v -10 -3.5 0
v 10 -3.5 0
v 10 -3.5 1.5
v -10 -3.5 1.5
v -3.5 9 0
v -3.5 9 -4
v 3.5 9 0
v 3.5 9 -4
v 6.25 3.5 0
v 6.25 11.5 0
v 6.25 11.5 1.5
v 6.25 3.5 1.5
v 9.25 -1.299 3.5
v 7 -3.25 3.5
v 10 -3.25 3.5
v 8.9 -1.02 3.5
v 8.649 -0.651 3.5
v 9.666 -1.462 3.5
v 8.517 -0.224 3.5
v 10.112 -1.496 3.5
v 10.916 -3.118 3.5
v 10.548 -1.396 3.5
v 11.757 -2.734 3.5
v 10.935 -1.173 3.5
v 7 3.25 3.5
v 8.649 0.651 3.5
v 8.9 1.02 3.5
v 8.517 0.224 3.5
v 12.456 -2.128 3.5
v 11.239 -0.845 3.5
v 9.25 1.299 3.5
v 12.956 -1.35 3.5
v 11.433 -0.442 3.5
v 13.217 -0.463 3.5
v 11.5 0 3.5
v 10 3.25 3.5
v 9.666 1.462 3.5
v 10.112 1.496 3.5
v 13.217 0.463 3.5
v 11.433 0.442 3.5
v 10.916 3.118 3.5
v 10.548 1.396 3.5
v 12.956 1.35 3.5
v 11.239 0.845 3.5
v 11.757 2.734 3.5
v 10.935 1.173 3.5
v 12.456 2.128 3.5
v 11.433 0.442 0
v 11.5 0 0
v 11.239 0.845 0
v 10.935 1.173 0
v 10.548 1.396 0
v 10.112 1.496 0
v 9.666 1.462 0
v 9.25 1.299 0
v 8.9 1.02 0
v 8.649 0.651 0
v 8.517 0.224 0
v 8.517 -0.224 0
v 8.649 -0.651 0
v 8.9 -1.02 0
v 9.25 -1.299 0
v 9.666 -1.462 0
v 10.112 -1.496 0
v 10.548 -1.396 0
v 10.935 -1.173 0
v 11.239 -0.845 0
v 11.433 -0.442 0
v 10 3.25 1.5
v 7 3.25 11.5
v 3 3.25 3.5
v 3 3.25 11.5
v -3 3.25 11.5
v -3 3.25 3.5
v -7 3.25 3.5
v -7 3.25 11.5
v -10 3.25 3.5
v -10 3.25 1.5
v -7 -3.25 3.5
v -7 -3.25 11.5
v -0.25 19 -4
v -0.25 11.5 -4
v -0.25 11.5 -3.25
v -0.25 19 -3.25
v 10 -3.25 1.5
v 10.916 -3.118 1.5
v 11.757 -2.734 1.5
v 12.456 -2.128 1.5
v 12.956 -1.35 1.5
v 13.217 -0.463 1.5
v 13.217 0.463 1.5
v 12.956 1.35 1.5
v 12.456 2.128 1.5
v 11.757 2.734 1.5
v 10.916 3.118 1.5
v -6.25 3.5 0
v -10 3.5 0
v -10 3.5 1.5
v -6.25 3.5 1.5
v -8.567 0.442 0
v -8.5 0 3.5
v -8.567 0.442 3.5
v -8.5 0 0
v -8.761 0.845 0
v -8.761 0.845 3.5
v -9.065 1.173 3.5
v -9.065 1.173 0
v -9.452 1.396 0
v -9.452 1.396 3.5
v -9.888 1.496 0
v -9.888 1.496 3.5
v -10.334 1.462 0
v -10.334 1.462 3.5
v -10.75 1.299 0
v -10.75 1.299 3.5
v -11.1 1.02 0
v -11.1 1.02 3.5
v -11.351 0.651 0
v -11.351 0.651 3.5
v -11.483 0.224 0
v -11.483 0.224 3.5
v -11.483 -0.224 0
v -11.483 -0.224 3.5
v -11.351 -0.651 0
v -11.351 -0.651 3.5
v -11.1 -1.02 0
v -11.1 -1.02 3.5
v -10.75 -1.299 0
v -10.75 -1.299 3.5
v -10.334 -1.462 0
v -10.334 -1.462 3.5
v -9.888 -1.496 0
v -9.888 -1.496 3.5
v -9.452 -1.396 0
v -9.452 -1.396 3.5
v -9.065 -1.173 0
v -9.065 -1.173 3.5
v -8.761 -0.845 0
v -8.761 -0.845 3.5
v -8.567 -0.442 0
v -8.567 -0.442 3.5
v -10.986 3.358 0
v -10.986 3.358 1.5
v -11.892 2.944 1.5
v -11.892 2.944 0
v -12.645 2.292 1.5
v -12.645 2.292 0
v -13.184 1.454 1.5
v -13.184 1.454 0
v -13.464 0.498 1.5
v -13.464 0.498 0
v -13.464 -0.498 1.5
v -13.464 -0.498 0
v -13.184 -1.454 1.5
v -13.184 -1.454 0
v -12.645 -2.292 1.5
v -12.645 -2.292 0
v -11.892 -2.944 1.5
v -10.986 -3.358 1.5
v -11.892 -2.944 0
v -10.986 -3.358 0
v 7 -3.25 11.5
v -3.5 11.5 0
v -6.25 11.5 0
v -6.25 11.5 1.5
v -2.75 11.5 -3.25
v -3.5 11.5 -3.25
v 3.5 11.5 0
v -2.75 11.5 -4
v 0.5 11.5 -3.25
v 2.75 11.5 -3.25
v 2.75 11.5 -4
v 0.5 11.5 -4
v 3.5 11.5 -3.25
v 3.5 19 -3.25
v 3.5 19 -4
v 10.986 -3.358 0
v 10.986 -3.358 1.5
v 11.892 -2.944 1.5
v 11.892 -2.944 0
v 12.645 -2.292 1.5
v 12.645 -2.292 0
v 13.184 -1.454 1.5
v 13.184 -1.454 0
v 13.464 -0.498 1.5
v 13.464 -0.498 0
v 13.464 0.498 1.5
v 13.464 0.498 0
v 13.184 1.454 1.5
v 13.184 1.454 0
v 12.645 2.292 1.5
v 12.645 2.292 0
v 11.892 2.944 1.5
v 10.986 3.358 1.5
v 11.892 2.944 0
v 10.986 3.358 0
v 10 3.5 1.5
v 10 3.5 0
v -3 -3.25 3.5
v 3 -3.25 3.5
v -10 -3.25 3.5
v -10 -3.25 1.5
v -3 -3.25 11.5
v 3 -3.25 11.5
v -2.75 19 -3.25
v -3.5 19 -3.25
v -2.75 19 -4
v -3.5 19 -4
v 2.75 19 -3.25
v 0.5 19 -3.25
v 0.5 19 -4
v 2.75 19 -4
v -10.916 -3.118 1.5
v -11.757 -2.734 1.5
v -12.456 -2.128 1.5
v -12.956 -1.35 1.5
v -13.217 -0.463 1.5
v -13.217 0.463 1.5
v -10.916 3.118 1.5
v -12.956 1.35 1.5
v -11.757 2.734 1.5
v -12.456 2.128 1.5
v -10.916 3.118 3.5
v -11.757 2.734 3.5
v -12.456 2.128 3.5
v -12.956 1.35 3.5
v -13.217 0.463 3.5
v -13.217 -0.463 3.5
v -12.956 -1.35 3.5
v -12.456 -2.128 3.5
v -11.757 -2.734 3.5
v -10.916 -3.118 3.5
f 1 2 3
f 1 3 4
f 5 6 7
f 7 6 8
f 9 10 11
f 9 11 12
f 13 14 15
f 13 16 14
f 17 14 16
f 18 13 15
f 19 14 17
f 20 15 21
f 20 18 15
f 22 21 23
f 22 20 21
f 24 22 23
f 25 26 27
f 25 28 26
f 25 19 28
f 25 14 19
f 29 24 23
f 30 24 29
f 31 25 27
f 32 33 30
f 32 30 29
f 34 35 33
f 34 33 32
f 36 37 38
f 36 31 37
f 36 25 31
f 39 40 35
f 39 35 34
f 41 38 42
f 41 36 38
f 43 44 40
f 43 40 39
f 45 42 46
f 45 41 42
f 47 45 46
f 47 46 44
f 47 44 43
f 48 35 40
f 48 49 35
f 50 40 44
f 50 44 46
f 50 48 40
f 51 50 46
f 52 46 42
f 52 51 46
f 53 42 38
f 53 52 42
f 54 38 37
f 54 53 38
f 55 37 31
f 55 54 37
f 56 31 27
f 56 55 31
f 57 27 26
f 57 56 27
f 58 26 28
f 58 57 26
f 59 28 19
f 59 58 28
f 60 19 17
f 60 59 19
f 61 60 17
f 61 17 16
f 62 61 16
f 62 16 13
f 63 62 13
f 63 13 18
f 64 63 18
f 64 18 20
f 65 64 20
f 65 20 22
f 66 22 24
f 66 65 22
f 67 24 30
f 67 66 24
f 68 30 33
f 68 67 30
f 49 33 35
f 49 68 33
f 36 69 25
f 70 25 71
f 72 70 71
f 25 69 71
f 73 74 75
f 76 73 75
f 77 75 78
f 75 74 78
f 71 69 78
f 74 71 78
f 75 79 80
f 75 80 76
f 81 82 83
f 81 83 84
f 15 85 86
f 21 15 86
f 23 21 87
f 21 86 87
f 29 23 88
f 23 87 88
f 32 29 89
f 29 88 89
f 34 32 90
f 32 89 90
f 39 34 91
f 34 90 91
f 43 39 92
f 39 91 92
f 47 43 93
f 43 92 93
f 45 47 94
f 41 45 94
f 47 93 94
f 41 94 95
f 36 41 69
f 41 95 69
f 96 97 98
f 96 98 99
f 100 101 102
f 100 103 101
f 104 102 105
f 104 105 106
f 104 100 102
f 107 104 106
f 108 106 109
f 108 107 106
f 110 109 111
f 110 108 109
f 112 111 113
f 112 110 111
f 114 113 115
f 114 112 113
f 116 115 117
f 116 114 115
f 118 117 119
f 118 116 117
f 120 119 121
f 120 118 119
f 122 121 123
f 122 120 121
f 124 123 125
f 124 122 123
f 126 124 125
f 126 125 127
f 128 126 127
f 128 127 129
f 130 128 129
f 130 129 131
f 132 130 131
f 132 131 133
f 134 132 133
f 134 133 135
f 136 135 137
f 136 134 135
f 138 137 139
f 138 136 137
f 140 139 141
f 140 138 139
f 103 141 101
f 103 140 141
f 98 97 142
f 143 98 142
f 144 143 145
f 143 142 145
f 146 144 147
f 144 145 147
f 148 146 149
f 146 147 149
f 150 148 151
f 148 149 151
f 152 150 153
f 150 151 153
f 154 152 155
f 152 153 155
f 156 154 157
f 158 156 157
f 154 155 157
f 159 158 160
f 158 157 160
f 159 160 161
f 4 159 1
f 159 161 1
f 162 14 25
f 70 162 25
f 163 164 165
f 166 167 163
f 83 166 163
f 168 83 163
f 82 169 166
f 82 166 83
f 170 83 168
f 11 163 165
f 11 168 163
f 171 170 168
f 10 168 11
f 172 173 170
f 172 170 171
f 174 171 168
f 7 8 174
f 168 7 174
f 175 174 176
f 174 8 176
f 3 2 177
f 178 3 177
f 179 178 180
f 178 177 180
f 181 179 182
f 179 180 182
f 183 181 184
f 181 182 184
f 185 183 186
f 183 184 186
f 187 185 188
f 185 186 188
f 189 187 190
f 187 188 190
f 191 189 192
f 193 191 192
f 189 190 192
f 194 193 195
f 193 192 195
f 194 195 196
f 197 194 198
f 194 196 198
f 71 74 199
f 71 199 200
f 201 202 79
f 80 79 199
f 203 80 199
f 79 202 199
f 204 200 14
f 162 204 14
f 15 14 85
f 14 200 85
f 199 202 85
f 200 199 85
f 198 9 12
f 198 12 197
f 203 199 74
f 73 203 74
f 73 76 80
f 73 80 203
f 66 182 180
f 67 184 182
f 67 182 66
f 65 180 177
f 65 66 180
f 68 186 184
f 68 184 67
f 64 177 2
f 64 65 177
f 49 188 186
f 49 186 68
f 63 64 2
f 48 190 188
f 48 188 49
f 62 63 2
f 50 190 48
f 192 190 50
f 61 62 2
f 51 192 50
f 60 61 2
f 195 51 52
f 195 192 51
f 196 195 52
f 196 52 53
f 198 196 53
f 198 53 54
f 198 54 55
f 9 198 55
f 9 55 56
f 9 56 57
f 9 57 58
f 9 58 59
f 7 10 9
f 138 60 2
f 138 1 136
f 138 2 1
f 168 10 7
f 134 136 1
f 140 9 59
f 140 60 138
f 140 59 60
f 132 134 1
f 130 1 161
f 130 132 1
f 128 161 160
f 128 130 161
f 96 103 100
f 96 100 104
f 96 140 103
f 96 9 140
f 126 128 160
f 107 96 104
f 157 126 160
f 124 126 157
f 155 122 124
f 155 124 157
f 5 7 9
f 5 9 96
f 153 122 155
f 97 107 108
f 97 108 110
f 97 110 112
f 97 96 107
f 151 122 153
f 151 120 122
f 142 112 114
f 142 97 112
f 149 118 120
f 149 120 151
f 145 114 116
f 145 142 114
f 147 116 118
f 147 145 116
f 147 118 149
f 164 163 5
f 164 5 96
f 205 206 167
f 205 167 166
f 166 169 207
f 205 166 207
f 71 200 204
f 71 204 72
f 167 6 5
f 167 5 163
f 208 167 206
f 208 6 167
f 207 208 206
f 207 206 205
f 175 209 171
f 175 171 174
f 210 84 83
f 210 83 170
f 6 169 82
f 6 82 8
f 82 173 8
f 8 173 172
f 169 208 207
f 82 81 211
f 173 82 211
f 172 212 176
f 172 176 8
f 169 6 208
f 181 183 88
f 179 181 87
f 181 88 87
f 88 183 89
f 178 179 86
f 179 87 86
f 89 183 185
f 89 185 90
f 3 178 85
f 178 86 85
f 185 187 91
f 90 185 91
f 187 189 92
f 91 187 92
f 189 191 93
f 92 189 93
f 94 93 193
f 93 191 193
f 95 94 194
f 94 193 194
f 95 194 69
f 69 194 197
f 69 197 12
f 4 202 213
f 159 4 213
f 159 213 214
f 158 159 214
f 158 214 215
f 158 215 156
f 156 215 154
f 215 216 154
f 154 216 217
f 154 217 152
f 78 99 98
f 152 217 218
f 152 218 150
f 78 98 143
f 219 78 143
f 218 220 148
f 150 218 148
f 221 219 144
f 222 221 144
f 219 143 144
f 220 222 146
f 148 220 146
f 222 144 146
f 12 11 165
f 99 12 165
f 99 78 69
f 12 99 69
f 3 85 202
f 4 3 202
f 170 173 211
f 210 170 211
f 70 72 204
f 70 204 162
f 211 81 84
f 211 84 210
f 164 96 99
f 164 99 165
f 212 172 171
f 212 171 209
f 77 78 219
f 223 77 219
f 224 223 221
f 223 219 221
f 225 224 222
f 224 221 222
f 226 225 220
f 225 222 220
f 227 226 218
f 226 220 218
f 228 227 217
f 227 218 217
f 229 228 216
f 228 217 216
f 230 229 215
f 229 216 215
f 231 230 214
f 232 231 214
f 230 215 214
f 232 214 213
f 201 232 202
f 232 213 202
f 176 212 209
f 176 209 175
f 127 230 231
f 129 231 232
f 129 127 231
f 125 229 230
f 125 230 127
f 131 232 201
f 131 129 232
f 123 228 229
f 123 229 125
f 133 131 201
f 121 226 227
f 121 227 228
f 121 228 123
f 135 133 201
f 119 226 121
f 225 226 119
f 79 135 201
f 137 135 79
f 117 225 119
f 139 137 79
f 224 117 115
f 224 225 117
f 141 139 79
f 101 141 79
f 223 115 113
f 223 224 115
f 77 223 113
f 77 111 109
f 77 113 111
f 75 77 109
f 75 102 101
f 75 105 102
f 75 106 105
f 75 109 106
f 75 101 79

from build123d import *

# Parameters (mm, degrees)
BOX005_W         = 0.75
BOX005_H         = 10
BOX005_DEPTH     = 0.75
BOX006_W         = 0.75
BOX006_H         = 10
BOX006_DEPTH     = 0.75
BOX007_W         = 0.75
BOX007_H         = 10
BOX007_DEPTH     = 0.75
BOX004_W         = 7
BOX004_H         = 2.5
BOX004_DEPTH     = 4
SKETCH006_R      = 1.5
EXTRUDE003_DEPTH = 2
SKETCH005_R      = 1.5
EXTRUDE002_DEPTH = 1.5
SKETCH007_W      = 4
SKETCH007_H      = 6.5
EXTRUDE004_DEPTH = 8


with BuildPart() as cube001:
    # Box005 → Box005 (new body)
    with BuildSketch(Plane(origin=(2.75, 9, -4), x_dir=(1, 0, 0), z_dir=(0, 0, 1))):
        with Locations((0.375, 5)):
            Rectangle(BOX005_W, BOX005_H)
    extrude(amount=BOX005_DEPTH)


with BuildPart() as cube002:
    # Box006 → Box006 (new body)
    with BuildSketch(Plane(origin=(-0.25, 9, -4), x_dir=(1, 0, 0), z_dir=(0, 0, 1))):
        with Locations((0.375, 5)):
            Rectangle(BOX006_W, BOX006_H)
    extrude(amount=BOX006_DEPTH)


with BuildPart() as cube003:
    # Box007 → Box007 (new body)
    with BuildSketch(Plane(origin=(-3.5, 9, -4), x_dir=(1, 0, 0), z_dir=(0, 0, 1))):
        with Locations((0.375, 5)):
            Rectangle(BOX007_W, BOX007_H)
    extrude(amount=BOX007_DEPTH)


with BuildPart() as fusion005:
    # Box004 → Box004 (new body)
    with BuildSketch(Plane(origin=(-3.5, 9, -4), x_dir=(1, 0, 0), z_dir=(0, 0, 1))):
        with Locations((3.5, 1.25)):
            Rectangle(BOX004_W, BOX004_H)
    extrude(amount=BOX004_DEPTH)

    # Fusion005: union Cube001, Cube002, Cube003
    add(cube001.part)
    add(cube002.part)
    add(cube003.part)


with BuildPart() as extrude003:
    # Sketch006 → Extrude003 (new body)
    with BuildSketch(Plane.XY):
        with BuildLine():
            ThreePointArc((-10, 3.25), (-13.25, 0), (-10, -3.25))
            Line((-10, -3.25), (10, -3.25))
            ThreePointArc((10, -3.25), (13.25, 0), (10, 3.25))
            Line((10, 3.25), (-10, 3.25))
        make_face()
        with Locations((-10, 0)):
            Circle(SKETCH006_R, mode=Mode.SUBTRACT)
        with Locations((10, 0)):
            Circle(SKETCH006_R, mode=Mode.SUBTRACT)
    extrude(amount=EXTRUDE003_DEPTH)


with BuildPart() as extrude003_1:
    # Extrude003 placement: moved
    add(extrude003.part.moved(Location((0, 0, 1.5))))


with BuildPart() as fusion003:
    # Sketch005 → Extrude002 (new body)
    with BuildSketch(Plane.XY):
        with BuildLine():
            Line((-6.25, 11.5), (6.25, 11.5))
            Line((6.25, 11.5), (6.25, 3.5))
            Line((6.25, 3.5), (10, 3.5))
            ThreePointArc((10, -3.5), (13.5, 0), (10, 3.5))
            Line((10, -3.5), (-10, -3.5))
            ThreePointArc((-10, 3.5), (-13.5, 0), (-10, -3.5))
            Line((-10, 3.5), (-6.25, 3.5))
            Line((-6.25, 3.5), (-6.25, 11.5))
        make_face()
        with Locations((-10, 0)):
            Circle(SKETCH005_R, mode=Mode.SUBTRACT)
        with Locations((10, 0)):
            Circle(SKETCH005_R, mode=Mode.SUBTRACT)
    extrude(amount=EXTRUDE002_DEPTH)

    # Fusion003: union Extrude003
    add(extrude003_1.part)


with BuildPart() as extrude004:
    # Sketch007 (on Face15 of Fusion003) → Extrude004 (new body)
    with BuildSketch(Plane.XY.offset(3.5)):
        with Locations((5, 0)):
            Rectangle(SKETCH007_W, SKETCH007_H)
        with Locations((-5, 0)):
            Rectangle(SKETCH007_W, SKETCH007_H)
    extrude(amount=EXTRUDE004_DEPTH)


with BuildPart() as fusion006:
    # Fusion004 base: copy of Fusion003
    add(fusion003.part)

    # Fusion004: union Extrude004
    add(extrude004.part)

    # Fusion006: union Fusion005, Fusion003, Extrude004
    add(fusion005.part)
    add(fusion003.part)
    add(extrude004.part)


solid = fusion006.part
